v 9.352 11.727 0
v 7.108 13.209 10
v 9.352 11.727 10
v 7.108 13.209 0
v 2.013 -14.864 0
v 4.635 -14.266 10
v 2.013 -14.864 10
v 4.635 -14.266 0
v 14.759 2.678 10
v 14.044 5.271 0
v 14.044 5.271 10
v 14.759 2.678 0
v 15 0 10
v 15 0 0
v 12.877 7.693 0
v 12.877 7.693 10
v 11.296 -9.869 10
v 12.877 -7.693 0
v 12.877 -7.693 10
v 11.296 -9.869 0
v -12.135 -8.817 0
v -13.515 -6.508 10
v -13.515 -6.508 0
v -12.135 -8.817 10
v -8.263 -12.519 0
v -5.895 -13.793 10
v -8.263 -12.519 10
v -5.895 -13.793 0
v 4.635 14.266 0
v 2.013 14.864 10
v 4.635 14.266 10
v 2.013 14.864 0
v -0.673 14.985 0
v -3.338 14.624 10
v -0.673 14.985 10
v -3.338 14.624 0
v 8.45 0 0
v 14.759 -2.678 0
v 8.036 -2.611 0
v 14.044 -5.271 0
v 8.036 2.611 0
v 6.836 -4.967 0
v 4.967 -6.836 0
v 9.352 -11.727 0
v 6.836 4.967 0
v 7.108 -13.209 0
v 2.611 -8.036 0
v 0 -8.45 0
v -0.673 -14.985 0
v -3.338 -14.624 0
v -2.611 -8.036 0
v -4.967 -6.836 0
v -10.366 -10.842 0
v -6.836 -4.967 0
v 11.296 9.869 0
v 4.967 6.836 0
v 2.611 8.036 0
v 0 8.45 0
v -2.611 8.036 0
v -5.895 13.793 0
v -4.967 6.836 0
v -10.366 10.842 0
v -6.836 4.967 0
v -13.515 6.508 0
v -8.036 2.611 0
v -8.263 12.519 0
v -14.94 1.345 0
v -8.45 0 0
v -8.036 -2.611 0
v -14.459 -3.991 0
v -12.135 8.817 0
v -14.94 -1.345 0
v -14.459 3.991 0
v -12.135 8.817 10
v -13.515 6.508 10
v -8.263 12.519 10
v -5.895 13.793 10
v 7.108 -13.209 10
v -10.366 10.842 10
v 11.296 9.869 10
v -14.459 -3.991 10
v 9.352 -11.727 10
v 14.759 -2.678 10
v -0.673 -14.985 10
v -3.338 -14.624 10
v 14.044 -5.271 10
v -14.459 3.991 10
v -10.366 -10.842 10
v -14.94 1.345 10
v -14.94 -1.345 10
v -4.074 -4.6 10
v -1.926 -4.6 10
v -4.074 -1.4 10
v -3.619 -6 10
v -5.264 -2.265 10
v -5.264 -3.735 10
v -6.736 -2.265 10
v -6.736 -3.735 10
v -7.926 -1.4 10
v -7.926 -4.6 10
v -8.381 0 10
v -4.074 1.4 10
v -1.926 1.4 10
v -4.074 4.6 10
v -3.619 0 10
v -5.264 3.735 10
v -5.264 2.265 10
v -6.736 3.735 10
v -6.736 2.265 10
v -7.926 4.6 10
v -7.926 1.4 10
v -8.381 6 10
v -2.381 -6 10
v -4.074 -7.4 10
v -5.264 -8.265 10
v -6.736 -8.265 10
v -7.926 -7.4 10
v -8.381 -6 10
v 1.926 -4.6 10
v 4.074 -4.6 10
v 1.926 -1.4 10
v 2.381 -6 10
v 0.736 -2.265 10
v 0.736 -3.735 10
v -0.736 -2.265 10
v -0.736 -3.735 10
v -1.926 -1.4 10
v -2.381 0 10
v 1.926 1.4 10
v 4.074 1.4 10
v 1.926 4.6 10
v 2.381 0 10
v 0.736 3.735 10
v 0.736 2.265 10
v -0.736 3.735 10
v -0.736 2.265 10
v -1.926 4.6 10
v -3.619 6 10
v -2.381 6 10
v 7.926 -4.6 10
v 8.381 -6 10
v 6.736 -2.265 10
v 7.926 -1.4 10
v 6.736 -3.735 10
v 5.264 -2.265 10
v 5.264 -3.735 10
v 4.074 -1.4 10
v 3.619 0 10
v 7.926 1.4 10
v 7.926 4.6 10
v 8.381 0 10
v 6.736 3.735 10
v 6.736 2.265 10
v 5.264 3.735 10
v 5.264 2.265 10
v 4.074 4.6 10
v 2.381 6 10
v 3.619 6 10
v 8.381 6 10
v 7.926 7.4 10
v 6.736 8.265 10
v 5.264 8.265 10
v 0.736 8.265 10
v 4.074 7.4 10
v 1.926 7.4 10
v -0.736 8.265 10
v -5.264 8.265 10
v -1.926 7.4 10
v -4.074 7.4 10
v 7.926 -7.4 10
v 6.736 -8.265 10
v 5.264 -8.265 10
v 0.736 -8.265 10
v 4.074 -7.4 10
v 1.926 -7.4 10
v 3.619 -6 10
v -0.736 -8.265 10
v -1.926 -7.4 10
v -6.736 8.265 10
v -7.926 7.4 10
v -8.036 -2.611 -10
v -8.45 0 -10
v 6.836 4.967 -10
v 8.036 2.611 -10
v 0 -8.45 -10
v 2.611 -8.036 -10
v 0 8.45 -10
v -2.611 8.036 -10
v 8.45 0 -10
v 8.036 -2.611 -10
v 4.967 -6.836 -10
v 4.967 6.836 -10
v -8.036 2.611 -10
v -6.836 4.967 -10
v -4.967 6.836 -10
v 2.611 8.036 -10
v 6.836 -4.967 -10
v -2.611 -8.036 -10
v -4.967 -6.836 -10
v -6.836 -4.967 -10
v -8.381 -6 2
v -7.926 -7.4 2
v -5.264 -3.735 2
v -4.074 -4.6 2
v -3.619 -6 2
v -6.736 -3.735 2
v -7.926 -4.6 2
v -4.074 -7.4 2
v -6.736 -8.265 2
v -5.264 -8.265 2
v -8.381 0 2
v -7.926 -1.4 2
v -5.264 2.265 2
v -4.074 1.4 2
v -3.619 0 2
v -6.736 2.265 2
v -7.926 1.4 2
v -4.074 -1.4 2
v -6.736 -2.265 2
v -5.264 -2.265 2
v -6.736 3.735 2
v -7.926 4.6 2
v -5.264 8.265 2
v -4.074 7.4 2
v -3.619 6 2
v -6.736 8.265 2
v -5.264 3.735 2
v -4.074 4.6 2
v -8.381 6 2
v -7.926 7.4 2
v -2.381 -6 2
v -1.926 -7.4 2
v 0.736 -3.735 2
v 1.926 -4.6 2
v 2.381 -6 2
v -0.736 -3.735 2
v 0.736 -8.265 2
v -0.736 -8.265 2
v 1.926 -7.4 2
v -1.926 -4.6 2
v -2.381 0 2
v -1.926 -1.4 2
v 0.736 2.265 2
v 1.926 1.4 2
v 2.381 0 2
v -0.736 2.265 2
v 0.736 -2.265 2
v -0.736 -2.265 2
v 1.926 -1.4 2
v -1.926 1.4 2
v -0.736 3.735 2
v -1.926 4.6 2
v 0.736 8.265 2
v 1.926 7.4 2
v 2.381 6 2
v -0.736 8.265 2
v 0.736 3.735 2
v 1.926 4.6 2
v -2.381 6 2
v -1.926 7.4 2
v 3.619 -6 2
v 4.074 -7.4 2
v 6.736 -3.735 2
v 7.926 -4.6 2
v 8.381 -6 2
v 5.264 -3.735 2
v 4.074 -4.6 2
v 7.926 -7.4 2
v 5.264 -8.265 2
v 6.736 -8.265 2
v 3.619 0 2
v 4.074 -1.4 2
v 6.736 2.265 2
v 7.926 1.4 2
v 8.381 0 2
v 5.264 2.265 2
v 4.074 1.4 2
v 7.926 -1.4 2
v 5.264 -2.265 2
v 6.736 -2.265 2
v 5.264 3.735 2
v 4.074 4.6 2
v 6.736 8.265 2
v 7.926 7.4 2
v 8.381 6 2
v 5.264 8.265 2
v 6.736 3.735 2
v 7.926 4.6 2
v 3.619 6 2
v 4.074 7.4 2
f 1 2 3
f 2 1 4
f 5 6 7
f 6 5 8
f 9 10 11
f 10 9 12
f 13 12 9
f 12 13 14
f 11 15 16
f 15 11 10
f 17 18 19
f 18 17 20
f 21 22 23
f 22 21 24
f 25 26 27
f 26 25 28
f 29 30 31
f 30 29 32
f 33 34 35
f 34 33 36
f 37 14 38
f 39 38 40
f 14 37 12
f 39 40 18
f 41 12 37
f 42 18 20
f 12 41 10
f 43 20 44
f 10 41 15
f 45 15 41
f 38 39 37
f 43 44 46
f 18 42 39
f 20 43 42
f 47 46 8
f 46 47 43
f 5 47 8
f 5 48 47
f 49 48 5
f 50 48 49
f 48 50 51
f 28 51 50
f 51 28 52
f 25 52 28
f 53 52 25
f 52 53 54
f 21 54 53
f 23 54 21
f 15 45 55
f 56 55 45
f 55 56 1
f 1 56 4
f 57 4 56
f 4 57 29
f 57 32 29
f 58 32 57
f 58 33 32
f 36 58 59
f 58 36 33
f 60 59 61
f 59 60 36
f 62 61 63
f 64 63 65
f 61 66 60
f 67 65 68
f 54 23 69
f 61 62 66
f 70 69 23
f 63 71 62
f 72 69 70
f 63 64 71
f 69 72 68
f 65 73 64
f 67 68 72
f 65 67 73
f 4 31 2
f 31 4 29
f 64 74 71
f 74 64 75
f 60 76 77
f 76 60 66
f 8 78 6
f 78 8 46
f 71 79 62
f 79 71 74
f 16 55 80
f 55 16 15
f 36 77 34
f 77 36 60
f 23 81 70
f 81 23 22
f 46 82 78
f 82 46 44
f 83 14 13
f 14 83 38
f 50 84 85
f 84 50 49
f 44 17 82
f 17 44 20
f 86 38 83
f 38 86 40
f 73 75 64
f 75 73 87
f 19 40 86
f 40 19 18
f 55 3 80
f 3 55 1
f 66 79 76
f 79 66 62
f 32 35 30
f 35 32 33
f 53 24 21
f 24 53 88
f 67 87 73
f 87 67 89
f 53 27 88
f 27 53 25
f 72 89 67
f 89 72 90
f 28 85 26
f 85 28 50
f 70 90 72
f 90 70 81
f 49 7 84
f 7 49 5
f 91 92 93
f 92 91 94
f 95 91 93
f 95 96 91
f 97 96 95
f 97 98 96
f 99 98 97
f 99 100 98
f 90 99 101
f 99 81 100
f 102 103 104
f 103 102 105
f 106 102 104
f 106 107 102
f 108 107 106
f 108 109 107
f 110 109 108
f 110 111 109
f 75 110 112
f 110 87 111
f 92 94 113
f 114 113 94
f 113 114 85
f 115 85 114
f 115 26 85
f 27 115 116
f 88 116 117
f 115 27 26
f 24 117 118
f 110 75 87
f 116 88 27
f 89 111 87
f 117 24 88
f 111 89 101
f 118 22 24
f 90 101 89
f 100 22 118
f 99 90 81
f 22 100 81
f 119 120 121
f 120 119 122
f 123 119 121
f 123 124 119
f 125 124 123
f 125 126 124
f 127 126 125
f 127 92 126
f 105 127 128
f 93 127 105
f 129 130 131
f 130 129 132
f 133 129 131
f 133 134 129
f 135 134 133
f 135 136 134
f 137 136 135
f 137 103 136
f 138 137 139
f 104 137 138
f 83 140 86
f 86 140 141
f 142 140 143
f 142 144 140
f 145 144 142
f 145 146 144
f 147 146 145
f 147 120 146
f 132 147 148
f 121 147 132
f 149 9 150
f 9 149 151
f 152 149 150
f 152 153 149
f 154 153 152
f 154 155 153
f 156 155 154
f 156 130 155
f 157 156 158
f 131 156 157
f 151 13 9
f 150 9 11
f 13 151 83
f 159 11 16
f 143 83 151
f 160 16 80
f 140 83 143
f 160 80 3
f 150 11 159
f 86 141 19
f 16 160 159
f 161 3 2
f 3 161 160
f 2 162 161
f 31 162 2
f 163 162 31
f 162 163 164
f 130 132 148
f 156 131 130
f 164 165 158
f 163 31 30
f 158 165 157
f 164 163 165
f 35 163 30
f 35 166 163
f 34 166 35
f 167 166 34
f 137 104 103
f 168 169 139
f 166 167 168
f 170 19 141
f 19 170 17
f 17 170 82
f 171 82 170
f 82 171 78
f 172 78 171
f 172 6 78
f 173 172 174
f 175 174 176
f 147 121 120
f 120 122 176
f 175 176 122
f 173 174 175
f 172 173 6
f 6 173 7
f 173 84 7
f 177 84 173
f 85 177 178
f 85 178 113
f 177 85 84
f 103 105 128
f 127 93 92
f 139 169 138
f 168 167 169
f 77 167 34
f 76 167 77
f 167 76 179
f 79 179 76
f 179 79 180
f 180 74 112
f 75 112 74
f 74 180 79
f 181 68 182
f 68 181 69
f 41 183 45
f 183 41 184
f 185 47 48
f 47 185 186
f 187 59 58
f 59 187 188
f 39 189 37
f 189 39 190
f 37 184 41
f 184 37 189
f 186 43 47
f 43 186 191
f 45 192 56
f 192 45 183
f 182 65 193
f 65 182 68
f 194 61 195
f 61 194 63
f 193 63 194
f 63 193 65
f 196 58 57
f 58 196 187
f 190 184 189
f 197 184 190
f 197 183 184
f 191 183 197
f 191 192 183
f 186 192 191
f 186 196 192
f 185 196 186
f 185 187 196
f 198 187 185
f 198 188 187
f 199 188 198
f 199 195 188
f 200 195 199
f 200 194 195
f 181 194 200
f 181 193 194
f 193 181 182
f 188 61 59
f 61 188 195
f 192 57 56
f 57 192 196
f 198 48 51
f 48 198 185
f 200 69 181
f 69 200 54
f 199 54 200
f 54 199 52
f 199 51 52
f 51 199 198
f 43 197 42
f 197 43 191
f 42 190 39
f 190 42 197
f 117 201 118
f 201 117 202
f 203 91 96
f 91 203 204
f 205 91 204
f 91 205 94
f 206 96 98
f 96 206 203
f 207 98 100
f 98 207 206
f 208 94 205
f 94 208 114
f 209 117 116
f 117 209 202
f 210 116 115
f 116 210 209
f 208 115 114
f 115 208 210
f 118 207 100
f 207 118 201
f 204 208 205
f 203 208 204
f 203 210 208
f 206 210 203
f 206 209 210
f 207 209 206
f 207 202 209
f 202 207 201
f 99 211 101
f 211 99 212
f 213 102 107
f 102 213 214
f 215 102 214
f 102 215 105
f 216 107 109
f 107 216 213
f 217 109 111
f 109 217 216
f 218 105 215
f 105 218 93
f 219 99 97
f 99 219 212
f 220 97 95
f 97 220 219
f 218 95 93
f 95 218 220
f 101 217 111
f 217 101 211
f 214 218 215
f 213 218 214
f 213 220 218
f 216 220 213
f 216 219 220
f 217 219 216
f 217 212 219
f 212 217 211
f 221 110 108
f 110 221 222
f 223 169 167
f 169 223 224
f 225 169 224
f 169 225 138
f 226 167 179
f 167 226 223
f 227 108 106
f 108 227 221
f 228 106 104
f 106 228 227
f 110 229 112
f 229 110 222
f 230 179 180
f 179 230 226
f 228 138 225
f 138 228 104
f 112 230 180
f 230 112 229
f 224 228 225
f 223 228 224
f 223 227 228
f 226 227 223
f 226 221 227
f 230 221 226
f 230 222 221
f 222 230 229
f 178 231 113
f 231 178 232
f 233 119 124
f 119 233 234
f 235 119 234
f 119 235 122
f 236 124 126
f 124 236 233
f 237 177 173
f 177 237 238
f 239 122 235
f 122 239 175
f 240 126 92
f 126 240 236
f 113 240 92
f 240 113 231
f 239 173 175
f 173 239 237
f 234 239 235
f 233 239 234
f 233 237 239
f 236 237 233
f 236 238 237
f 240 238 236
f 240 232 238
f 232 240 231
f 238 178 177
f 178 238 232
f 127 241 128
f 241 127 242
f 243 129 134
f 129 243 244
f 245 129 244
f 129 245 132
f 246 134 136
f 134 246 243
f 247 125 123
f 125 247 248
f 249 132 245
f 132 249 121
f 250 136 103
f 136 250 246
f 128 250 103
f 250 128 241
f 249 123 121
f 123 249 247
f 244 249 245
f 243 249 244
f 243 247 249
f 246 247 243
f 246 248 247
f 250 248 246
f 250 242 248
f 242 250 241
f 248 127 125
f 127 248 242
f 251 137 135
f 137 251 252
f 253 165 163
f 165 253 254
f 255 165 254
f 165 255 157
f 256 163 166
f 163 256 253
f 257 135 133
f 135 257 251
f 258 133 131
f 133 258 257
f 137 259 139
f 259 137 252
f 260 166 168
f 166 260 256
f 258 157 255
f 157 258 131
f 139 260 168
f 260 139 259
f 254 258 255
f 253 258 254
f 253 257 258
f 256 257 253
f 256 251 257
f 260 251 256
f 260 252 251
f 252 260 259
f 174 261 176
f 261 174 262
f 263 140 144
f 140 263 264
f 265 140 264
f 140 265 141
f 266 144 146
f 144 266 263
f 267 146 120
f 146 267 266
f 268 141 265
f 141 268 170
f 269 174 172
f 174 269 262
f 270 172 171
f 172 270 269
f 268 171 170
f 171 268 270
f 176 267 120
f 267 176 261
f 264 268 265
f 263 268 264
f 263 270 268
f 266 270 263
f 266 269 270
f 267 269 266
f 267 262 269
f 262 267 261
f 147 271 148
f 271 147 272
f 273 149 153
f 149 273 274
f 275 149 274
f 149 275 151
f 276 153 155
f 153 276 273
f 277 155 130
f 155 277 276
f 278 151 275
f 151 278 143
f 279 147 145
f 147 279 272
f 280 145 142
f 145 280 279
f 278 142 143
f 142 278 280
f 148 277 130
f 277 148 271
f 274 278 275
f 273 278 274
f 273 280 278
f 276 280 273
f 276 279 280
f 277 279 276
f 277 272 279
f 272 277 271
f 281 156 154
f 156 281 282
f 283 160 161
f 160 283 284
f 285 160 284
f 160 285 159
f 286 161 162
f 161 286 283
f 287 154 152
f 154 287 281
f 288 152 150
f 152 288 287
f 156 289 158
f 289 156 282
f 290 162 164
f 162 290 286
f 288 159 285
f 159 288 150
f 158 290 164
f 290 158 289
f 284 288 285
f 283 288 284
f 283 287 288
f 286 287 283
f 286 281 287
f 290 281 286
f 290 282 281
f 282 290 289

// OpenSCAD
tol=0.1;
insert_len=10;

$fn=35;

difference() {
    union() {
        cylinder(d=30, h=10);
        translate([0,0,-insert_len]) cylinder($fn=20, d=17-tol, h=insert_len);
    }

    for (dx = [-6 : 6 : 6])
        for (dy = [-6 : 6 : 6])
            translate([dx,dy,2]) cylinder(d=4.7625, h=8, $fn=10);
}
